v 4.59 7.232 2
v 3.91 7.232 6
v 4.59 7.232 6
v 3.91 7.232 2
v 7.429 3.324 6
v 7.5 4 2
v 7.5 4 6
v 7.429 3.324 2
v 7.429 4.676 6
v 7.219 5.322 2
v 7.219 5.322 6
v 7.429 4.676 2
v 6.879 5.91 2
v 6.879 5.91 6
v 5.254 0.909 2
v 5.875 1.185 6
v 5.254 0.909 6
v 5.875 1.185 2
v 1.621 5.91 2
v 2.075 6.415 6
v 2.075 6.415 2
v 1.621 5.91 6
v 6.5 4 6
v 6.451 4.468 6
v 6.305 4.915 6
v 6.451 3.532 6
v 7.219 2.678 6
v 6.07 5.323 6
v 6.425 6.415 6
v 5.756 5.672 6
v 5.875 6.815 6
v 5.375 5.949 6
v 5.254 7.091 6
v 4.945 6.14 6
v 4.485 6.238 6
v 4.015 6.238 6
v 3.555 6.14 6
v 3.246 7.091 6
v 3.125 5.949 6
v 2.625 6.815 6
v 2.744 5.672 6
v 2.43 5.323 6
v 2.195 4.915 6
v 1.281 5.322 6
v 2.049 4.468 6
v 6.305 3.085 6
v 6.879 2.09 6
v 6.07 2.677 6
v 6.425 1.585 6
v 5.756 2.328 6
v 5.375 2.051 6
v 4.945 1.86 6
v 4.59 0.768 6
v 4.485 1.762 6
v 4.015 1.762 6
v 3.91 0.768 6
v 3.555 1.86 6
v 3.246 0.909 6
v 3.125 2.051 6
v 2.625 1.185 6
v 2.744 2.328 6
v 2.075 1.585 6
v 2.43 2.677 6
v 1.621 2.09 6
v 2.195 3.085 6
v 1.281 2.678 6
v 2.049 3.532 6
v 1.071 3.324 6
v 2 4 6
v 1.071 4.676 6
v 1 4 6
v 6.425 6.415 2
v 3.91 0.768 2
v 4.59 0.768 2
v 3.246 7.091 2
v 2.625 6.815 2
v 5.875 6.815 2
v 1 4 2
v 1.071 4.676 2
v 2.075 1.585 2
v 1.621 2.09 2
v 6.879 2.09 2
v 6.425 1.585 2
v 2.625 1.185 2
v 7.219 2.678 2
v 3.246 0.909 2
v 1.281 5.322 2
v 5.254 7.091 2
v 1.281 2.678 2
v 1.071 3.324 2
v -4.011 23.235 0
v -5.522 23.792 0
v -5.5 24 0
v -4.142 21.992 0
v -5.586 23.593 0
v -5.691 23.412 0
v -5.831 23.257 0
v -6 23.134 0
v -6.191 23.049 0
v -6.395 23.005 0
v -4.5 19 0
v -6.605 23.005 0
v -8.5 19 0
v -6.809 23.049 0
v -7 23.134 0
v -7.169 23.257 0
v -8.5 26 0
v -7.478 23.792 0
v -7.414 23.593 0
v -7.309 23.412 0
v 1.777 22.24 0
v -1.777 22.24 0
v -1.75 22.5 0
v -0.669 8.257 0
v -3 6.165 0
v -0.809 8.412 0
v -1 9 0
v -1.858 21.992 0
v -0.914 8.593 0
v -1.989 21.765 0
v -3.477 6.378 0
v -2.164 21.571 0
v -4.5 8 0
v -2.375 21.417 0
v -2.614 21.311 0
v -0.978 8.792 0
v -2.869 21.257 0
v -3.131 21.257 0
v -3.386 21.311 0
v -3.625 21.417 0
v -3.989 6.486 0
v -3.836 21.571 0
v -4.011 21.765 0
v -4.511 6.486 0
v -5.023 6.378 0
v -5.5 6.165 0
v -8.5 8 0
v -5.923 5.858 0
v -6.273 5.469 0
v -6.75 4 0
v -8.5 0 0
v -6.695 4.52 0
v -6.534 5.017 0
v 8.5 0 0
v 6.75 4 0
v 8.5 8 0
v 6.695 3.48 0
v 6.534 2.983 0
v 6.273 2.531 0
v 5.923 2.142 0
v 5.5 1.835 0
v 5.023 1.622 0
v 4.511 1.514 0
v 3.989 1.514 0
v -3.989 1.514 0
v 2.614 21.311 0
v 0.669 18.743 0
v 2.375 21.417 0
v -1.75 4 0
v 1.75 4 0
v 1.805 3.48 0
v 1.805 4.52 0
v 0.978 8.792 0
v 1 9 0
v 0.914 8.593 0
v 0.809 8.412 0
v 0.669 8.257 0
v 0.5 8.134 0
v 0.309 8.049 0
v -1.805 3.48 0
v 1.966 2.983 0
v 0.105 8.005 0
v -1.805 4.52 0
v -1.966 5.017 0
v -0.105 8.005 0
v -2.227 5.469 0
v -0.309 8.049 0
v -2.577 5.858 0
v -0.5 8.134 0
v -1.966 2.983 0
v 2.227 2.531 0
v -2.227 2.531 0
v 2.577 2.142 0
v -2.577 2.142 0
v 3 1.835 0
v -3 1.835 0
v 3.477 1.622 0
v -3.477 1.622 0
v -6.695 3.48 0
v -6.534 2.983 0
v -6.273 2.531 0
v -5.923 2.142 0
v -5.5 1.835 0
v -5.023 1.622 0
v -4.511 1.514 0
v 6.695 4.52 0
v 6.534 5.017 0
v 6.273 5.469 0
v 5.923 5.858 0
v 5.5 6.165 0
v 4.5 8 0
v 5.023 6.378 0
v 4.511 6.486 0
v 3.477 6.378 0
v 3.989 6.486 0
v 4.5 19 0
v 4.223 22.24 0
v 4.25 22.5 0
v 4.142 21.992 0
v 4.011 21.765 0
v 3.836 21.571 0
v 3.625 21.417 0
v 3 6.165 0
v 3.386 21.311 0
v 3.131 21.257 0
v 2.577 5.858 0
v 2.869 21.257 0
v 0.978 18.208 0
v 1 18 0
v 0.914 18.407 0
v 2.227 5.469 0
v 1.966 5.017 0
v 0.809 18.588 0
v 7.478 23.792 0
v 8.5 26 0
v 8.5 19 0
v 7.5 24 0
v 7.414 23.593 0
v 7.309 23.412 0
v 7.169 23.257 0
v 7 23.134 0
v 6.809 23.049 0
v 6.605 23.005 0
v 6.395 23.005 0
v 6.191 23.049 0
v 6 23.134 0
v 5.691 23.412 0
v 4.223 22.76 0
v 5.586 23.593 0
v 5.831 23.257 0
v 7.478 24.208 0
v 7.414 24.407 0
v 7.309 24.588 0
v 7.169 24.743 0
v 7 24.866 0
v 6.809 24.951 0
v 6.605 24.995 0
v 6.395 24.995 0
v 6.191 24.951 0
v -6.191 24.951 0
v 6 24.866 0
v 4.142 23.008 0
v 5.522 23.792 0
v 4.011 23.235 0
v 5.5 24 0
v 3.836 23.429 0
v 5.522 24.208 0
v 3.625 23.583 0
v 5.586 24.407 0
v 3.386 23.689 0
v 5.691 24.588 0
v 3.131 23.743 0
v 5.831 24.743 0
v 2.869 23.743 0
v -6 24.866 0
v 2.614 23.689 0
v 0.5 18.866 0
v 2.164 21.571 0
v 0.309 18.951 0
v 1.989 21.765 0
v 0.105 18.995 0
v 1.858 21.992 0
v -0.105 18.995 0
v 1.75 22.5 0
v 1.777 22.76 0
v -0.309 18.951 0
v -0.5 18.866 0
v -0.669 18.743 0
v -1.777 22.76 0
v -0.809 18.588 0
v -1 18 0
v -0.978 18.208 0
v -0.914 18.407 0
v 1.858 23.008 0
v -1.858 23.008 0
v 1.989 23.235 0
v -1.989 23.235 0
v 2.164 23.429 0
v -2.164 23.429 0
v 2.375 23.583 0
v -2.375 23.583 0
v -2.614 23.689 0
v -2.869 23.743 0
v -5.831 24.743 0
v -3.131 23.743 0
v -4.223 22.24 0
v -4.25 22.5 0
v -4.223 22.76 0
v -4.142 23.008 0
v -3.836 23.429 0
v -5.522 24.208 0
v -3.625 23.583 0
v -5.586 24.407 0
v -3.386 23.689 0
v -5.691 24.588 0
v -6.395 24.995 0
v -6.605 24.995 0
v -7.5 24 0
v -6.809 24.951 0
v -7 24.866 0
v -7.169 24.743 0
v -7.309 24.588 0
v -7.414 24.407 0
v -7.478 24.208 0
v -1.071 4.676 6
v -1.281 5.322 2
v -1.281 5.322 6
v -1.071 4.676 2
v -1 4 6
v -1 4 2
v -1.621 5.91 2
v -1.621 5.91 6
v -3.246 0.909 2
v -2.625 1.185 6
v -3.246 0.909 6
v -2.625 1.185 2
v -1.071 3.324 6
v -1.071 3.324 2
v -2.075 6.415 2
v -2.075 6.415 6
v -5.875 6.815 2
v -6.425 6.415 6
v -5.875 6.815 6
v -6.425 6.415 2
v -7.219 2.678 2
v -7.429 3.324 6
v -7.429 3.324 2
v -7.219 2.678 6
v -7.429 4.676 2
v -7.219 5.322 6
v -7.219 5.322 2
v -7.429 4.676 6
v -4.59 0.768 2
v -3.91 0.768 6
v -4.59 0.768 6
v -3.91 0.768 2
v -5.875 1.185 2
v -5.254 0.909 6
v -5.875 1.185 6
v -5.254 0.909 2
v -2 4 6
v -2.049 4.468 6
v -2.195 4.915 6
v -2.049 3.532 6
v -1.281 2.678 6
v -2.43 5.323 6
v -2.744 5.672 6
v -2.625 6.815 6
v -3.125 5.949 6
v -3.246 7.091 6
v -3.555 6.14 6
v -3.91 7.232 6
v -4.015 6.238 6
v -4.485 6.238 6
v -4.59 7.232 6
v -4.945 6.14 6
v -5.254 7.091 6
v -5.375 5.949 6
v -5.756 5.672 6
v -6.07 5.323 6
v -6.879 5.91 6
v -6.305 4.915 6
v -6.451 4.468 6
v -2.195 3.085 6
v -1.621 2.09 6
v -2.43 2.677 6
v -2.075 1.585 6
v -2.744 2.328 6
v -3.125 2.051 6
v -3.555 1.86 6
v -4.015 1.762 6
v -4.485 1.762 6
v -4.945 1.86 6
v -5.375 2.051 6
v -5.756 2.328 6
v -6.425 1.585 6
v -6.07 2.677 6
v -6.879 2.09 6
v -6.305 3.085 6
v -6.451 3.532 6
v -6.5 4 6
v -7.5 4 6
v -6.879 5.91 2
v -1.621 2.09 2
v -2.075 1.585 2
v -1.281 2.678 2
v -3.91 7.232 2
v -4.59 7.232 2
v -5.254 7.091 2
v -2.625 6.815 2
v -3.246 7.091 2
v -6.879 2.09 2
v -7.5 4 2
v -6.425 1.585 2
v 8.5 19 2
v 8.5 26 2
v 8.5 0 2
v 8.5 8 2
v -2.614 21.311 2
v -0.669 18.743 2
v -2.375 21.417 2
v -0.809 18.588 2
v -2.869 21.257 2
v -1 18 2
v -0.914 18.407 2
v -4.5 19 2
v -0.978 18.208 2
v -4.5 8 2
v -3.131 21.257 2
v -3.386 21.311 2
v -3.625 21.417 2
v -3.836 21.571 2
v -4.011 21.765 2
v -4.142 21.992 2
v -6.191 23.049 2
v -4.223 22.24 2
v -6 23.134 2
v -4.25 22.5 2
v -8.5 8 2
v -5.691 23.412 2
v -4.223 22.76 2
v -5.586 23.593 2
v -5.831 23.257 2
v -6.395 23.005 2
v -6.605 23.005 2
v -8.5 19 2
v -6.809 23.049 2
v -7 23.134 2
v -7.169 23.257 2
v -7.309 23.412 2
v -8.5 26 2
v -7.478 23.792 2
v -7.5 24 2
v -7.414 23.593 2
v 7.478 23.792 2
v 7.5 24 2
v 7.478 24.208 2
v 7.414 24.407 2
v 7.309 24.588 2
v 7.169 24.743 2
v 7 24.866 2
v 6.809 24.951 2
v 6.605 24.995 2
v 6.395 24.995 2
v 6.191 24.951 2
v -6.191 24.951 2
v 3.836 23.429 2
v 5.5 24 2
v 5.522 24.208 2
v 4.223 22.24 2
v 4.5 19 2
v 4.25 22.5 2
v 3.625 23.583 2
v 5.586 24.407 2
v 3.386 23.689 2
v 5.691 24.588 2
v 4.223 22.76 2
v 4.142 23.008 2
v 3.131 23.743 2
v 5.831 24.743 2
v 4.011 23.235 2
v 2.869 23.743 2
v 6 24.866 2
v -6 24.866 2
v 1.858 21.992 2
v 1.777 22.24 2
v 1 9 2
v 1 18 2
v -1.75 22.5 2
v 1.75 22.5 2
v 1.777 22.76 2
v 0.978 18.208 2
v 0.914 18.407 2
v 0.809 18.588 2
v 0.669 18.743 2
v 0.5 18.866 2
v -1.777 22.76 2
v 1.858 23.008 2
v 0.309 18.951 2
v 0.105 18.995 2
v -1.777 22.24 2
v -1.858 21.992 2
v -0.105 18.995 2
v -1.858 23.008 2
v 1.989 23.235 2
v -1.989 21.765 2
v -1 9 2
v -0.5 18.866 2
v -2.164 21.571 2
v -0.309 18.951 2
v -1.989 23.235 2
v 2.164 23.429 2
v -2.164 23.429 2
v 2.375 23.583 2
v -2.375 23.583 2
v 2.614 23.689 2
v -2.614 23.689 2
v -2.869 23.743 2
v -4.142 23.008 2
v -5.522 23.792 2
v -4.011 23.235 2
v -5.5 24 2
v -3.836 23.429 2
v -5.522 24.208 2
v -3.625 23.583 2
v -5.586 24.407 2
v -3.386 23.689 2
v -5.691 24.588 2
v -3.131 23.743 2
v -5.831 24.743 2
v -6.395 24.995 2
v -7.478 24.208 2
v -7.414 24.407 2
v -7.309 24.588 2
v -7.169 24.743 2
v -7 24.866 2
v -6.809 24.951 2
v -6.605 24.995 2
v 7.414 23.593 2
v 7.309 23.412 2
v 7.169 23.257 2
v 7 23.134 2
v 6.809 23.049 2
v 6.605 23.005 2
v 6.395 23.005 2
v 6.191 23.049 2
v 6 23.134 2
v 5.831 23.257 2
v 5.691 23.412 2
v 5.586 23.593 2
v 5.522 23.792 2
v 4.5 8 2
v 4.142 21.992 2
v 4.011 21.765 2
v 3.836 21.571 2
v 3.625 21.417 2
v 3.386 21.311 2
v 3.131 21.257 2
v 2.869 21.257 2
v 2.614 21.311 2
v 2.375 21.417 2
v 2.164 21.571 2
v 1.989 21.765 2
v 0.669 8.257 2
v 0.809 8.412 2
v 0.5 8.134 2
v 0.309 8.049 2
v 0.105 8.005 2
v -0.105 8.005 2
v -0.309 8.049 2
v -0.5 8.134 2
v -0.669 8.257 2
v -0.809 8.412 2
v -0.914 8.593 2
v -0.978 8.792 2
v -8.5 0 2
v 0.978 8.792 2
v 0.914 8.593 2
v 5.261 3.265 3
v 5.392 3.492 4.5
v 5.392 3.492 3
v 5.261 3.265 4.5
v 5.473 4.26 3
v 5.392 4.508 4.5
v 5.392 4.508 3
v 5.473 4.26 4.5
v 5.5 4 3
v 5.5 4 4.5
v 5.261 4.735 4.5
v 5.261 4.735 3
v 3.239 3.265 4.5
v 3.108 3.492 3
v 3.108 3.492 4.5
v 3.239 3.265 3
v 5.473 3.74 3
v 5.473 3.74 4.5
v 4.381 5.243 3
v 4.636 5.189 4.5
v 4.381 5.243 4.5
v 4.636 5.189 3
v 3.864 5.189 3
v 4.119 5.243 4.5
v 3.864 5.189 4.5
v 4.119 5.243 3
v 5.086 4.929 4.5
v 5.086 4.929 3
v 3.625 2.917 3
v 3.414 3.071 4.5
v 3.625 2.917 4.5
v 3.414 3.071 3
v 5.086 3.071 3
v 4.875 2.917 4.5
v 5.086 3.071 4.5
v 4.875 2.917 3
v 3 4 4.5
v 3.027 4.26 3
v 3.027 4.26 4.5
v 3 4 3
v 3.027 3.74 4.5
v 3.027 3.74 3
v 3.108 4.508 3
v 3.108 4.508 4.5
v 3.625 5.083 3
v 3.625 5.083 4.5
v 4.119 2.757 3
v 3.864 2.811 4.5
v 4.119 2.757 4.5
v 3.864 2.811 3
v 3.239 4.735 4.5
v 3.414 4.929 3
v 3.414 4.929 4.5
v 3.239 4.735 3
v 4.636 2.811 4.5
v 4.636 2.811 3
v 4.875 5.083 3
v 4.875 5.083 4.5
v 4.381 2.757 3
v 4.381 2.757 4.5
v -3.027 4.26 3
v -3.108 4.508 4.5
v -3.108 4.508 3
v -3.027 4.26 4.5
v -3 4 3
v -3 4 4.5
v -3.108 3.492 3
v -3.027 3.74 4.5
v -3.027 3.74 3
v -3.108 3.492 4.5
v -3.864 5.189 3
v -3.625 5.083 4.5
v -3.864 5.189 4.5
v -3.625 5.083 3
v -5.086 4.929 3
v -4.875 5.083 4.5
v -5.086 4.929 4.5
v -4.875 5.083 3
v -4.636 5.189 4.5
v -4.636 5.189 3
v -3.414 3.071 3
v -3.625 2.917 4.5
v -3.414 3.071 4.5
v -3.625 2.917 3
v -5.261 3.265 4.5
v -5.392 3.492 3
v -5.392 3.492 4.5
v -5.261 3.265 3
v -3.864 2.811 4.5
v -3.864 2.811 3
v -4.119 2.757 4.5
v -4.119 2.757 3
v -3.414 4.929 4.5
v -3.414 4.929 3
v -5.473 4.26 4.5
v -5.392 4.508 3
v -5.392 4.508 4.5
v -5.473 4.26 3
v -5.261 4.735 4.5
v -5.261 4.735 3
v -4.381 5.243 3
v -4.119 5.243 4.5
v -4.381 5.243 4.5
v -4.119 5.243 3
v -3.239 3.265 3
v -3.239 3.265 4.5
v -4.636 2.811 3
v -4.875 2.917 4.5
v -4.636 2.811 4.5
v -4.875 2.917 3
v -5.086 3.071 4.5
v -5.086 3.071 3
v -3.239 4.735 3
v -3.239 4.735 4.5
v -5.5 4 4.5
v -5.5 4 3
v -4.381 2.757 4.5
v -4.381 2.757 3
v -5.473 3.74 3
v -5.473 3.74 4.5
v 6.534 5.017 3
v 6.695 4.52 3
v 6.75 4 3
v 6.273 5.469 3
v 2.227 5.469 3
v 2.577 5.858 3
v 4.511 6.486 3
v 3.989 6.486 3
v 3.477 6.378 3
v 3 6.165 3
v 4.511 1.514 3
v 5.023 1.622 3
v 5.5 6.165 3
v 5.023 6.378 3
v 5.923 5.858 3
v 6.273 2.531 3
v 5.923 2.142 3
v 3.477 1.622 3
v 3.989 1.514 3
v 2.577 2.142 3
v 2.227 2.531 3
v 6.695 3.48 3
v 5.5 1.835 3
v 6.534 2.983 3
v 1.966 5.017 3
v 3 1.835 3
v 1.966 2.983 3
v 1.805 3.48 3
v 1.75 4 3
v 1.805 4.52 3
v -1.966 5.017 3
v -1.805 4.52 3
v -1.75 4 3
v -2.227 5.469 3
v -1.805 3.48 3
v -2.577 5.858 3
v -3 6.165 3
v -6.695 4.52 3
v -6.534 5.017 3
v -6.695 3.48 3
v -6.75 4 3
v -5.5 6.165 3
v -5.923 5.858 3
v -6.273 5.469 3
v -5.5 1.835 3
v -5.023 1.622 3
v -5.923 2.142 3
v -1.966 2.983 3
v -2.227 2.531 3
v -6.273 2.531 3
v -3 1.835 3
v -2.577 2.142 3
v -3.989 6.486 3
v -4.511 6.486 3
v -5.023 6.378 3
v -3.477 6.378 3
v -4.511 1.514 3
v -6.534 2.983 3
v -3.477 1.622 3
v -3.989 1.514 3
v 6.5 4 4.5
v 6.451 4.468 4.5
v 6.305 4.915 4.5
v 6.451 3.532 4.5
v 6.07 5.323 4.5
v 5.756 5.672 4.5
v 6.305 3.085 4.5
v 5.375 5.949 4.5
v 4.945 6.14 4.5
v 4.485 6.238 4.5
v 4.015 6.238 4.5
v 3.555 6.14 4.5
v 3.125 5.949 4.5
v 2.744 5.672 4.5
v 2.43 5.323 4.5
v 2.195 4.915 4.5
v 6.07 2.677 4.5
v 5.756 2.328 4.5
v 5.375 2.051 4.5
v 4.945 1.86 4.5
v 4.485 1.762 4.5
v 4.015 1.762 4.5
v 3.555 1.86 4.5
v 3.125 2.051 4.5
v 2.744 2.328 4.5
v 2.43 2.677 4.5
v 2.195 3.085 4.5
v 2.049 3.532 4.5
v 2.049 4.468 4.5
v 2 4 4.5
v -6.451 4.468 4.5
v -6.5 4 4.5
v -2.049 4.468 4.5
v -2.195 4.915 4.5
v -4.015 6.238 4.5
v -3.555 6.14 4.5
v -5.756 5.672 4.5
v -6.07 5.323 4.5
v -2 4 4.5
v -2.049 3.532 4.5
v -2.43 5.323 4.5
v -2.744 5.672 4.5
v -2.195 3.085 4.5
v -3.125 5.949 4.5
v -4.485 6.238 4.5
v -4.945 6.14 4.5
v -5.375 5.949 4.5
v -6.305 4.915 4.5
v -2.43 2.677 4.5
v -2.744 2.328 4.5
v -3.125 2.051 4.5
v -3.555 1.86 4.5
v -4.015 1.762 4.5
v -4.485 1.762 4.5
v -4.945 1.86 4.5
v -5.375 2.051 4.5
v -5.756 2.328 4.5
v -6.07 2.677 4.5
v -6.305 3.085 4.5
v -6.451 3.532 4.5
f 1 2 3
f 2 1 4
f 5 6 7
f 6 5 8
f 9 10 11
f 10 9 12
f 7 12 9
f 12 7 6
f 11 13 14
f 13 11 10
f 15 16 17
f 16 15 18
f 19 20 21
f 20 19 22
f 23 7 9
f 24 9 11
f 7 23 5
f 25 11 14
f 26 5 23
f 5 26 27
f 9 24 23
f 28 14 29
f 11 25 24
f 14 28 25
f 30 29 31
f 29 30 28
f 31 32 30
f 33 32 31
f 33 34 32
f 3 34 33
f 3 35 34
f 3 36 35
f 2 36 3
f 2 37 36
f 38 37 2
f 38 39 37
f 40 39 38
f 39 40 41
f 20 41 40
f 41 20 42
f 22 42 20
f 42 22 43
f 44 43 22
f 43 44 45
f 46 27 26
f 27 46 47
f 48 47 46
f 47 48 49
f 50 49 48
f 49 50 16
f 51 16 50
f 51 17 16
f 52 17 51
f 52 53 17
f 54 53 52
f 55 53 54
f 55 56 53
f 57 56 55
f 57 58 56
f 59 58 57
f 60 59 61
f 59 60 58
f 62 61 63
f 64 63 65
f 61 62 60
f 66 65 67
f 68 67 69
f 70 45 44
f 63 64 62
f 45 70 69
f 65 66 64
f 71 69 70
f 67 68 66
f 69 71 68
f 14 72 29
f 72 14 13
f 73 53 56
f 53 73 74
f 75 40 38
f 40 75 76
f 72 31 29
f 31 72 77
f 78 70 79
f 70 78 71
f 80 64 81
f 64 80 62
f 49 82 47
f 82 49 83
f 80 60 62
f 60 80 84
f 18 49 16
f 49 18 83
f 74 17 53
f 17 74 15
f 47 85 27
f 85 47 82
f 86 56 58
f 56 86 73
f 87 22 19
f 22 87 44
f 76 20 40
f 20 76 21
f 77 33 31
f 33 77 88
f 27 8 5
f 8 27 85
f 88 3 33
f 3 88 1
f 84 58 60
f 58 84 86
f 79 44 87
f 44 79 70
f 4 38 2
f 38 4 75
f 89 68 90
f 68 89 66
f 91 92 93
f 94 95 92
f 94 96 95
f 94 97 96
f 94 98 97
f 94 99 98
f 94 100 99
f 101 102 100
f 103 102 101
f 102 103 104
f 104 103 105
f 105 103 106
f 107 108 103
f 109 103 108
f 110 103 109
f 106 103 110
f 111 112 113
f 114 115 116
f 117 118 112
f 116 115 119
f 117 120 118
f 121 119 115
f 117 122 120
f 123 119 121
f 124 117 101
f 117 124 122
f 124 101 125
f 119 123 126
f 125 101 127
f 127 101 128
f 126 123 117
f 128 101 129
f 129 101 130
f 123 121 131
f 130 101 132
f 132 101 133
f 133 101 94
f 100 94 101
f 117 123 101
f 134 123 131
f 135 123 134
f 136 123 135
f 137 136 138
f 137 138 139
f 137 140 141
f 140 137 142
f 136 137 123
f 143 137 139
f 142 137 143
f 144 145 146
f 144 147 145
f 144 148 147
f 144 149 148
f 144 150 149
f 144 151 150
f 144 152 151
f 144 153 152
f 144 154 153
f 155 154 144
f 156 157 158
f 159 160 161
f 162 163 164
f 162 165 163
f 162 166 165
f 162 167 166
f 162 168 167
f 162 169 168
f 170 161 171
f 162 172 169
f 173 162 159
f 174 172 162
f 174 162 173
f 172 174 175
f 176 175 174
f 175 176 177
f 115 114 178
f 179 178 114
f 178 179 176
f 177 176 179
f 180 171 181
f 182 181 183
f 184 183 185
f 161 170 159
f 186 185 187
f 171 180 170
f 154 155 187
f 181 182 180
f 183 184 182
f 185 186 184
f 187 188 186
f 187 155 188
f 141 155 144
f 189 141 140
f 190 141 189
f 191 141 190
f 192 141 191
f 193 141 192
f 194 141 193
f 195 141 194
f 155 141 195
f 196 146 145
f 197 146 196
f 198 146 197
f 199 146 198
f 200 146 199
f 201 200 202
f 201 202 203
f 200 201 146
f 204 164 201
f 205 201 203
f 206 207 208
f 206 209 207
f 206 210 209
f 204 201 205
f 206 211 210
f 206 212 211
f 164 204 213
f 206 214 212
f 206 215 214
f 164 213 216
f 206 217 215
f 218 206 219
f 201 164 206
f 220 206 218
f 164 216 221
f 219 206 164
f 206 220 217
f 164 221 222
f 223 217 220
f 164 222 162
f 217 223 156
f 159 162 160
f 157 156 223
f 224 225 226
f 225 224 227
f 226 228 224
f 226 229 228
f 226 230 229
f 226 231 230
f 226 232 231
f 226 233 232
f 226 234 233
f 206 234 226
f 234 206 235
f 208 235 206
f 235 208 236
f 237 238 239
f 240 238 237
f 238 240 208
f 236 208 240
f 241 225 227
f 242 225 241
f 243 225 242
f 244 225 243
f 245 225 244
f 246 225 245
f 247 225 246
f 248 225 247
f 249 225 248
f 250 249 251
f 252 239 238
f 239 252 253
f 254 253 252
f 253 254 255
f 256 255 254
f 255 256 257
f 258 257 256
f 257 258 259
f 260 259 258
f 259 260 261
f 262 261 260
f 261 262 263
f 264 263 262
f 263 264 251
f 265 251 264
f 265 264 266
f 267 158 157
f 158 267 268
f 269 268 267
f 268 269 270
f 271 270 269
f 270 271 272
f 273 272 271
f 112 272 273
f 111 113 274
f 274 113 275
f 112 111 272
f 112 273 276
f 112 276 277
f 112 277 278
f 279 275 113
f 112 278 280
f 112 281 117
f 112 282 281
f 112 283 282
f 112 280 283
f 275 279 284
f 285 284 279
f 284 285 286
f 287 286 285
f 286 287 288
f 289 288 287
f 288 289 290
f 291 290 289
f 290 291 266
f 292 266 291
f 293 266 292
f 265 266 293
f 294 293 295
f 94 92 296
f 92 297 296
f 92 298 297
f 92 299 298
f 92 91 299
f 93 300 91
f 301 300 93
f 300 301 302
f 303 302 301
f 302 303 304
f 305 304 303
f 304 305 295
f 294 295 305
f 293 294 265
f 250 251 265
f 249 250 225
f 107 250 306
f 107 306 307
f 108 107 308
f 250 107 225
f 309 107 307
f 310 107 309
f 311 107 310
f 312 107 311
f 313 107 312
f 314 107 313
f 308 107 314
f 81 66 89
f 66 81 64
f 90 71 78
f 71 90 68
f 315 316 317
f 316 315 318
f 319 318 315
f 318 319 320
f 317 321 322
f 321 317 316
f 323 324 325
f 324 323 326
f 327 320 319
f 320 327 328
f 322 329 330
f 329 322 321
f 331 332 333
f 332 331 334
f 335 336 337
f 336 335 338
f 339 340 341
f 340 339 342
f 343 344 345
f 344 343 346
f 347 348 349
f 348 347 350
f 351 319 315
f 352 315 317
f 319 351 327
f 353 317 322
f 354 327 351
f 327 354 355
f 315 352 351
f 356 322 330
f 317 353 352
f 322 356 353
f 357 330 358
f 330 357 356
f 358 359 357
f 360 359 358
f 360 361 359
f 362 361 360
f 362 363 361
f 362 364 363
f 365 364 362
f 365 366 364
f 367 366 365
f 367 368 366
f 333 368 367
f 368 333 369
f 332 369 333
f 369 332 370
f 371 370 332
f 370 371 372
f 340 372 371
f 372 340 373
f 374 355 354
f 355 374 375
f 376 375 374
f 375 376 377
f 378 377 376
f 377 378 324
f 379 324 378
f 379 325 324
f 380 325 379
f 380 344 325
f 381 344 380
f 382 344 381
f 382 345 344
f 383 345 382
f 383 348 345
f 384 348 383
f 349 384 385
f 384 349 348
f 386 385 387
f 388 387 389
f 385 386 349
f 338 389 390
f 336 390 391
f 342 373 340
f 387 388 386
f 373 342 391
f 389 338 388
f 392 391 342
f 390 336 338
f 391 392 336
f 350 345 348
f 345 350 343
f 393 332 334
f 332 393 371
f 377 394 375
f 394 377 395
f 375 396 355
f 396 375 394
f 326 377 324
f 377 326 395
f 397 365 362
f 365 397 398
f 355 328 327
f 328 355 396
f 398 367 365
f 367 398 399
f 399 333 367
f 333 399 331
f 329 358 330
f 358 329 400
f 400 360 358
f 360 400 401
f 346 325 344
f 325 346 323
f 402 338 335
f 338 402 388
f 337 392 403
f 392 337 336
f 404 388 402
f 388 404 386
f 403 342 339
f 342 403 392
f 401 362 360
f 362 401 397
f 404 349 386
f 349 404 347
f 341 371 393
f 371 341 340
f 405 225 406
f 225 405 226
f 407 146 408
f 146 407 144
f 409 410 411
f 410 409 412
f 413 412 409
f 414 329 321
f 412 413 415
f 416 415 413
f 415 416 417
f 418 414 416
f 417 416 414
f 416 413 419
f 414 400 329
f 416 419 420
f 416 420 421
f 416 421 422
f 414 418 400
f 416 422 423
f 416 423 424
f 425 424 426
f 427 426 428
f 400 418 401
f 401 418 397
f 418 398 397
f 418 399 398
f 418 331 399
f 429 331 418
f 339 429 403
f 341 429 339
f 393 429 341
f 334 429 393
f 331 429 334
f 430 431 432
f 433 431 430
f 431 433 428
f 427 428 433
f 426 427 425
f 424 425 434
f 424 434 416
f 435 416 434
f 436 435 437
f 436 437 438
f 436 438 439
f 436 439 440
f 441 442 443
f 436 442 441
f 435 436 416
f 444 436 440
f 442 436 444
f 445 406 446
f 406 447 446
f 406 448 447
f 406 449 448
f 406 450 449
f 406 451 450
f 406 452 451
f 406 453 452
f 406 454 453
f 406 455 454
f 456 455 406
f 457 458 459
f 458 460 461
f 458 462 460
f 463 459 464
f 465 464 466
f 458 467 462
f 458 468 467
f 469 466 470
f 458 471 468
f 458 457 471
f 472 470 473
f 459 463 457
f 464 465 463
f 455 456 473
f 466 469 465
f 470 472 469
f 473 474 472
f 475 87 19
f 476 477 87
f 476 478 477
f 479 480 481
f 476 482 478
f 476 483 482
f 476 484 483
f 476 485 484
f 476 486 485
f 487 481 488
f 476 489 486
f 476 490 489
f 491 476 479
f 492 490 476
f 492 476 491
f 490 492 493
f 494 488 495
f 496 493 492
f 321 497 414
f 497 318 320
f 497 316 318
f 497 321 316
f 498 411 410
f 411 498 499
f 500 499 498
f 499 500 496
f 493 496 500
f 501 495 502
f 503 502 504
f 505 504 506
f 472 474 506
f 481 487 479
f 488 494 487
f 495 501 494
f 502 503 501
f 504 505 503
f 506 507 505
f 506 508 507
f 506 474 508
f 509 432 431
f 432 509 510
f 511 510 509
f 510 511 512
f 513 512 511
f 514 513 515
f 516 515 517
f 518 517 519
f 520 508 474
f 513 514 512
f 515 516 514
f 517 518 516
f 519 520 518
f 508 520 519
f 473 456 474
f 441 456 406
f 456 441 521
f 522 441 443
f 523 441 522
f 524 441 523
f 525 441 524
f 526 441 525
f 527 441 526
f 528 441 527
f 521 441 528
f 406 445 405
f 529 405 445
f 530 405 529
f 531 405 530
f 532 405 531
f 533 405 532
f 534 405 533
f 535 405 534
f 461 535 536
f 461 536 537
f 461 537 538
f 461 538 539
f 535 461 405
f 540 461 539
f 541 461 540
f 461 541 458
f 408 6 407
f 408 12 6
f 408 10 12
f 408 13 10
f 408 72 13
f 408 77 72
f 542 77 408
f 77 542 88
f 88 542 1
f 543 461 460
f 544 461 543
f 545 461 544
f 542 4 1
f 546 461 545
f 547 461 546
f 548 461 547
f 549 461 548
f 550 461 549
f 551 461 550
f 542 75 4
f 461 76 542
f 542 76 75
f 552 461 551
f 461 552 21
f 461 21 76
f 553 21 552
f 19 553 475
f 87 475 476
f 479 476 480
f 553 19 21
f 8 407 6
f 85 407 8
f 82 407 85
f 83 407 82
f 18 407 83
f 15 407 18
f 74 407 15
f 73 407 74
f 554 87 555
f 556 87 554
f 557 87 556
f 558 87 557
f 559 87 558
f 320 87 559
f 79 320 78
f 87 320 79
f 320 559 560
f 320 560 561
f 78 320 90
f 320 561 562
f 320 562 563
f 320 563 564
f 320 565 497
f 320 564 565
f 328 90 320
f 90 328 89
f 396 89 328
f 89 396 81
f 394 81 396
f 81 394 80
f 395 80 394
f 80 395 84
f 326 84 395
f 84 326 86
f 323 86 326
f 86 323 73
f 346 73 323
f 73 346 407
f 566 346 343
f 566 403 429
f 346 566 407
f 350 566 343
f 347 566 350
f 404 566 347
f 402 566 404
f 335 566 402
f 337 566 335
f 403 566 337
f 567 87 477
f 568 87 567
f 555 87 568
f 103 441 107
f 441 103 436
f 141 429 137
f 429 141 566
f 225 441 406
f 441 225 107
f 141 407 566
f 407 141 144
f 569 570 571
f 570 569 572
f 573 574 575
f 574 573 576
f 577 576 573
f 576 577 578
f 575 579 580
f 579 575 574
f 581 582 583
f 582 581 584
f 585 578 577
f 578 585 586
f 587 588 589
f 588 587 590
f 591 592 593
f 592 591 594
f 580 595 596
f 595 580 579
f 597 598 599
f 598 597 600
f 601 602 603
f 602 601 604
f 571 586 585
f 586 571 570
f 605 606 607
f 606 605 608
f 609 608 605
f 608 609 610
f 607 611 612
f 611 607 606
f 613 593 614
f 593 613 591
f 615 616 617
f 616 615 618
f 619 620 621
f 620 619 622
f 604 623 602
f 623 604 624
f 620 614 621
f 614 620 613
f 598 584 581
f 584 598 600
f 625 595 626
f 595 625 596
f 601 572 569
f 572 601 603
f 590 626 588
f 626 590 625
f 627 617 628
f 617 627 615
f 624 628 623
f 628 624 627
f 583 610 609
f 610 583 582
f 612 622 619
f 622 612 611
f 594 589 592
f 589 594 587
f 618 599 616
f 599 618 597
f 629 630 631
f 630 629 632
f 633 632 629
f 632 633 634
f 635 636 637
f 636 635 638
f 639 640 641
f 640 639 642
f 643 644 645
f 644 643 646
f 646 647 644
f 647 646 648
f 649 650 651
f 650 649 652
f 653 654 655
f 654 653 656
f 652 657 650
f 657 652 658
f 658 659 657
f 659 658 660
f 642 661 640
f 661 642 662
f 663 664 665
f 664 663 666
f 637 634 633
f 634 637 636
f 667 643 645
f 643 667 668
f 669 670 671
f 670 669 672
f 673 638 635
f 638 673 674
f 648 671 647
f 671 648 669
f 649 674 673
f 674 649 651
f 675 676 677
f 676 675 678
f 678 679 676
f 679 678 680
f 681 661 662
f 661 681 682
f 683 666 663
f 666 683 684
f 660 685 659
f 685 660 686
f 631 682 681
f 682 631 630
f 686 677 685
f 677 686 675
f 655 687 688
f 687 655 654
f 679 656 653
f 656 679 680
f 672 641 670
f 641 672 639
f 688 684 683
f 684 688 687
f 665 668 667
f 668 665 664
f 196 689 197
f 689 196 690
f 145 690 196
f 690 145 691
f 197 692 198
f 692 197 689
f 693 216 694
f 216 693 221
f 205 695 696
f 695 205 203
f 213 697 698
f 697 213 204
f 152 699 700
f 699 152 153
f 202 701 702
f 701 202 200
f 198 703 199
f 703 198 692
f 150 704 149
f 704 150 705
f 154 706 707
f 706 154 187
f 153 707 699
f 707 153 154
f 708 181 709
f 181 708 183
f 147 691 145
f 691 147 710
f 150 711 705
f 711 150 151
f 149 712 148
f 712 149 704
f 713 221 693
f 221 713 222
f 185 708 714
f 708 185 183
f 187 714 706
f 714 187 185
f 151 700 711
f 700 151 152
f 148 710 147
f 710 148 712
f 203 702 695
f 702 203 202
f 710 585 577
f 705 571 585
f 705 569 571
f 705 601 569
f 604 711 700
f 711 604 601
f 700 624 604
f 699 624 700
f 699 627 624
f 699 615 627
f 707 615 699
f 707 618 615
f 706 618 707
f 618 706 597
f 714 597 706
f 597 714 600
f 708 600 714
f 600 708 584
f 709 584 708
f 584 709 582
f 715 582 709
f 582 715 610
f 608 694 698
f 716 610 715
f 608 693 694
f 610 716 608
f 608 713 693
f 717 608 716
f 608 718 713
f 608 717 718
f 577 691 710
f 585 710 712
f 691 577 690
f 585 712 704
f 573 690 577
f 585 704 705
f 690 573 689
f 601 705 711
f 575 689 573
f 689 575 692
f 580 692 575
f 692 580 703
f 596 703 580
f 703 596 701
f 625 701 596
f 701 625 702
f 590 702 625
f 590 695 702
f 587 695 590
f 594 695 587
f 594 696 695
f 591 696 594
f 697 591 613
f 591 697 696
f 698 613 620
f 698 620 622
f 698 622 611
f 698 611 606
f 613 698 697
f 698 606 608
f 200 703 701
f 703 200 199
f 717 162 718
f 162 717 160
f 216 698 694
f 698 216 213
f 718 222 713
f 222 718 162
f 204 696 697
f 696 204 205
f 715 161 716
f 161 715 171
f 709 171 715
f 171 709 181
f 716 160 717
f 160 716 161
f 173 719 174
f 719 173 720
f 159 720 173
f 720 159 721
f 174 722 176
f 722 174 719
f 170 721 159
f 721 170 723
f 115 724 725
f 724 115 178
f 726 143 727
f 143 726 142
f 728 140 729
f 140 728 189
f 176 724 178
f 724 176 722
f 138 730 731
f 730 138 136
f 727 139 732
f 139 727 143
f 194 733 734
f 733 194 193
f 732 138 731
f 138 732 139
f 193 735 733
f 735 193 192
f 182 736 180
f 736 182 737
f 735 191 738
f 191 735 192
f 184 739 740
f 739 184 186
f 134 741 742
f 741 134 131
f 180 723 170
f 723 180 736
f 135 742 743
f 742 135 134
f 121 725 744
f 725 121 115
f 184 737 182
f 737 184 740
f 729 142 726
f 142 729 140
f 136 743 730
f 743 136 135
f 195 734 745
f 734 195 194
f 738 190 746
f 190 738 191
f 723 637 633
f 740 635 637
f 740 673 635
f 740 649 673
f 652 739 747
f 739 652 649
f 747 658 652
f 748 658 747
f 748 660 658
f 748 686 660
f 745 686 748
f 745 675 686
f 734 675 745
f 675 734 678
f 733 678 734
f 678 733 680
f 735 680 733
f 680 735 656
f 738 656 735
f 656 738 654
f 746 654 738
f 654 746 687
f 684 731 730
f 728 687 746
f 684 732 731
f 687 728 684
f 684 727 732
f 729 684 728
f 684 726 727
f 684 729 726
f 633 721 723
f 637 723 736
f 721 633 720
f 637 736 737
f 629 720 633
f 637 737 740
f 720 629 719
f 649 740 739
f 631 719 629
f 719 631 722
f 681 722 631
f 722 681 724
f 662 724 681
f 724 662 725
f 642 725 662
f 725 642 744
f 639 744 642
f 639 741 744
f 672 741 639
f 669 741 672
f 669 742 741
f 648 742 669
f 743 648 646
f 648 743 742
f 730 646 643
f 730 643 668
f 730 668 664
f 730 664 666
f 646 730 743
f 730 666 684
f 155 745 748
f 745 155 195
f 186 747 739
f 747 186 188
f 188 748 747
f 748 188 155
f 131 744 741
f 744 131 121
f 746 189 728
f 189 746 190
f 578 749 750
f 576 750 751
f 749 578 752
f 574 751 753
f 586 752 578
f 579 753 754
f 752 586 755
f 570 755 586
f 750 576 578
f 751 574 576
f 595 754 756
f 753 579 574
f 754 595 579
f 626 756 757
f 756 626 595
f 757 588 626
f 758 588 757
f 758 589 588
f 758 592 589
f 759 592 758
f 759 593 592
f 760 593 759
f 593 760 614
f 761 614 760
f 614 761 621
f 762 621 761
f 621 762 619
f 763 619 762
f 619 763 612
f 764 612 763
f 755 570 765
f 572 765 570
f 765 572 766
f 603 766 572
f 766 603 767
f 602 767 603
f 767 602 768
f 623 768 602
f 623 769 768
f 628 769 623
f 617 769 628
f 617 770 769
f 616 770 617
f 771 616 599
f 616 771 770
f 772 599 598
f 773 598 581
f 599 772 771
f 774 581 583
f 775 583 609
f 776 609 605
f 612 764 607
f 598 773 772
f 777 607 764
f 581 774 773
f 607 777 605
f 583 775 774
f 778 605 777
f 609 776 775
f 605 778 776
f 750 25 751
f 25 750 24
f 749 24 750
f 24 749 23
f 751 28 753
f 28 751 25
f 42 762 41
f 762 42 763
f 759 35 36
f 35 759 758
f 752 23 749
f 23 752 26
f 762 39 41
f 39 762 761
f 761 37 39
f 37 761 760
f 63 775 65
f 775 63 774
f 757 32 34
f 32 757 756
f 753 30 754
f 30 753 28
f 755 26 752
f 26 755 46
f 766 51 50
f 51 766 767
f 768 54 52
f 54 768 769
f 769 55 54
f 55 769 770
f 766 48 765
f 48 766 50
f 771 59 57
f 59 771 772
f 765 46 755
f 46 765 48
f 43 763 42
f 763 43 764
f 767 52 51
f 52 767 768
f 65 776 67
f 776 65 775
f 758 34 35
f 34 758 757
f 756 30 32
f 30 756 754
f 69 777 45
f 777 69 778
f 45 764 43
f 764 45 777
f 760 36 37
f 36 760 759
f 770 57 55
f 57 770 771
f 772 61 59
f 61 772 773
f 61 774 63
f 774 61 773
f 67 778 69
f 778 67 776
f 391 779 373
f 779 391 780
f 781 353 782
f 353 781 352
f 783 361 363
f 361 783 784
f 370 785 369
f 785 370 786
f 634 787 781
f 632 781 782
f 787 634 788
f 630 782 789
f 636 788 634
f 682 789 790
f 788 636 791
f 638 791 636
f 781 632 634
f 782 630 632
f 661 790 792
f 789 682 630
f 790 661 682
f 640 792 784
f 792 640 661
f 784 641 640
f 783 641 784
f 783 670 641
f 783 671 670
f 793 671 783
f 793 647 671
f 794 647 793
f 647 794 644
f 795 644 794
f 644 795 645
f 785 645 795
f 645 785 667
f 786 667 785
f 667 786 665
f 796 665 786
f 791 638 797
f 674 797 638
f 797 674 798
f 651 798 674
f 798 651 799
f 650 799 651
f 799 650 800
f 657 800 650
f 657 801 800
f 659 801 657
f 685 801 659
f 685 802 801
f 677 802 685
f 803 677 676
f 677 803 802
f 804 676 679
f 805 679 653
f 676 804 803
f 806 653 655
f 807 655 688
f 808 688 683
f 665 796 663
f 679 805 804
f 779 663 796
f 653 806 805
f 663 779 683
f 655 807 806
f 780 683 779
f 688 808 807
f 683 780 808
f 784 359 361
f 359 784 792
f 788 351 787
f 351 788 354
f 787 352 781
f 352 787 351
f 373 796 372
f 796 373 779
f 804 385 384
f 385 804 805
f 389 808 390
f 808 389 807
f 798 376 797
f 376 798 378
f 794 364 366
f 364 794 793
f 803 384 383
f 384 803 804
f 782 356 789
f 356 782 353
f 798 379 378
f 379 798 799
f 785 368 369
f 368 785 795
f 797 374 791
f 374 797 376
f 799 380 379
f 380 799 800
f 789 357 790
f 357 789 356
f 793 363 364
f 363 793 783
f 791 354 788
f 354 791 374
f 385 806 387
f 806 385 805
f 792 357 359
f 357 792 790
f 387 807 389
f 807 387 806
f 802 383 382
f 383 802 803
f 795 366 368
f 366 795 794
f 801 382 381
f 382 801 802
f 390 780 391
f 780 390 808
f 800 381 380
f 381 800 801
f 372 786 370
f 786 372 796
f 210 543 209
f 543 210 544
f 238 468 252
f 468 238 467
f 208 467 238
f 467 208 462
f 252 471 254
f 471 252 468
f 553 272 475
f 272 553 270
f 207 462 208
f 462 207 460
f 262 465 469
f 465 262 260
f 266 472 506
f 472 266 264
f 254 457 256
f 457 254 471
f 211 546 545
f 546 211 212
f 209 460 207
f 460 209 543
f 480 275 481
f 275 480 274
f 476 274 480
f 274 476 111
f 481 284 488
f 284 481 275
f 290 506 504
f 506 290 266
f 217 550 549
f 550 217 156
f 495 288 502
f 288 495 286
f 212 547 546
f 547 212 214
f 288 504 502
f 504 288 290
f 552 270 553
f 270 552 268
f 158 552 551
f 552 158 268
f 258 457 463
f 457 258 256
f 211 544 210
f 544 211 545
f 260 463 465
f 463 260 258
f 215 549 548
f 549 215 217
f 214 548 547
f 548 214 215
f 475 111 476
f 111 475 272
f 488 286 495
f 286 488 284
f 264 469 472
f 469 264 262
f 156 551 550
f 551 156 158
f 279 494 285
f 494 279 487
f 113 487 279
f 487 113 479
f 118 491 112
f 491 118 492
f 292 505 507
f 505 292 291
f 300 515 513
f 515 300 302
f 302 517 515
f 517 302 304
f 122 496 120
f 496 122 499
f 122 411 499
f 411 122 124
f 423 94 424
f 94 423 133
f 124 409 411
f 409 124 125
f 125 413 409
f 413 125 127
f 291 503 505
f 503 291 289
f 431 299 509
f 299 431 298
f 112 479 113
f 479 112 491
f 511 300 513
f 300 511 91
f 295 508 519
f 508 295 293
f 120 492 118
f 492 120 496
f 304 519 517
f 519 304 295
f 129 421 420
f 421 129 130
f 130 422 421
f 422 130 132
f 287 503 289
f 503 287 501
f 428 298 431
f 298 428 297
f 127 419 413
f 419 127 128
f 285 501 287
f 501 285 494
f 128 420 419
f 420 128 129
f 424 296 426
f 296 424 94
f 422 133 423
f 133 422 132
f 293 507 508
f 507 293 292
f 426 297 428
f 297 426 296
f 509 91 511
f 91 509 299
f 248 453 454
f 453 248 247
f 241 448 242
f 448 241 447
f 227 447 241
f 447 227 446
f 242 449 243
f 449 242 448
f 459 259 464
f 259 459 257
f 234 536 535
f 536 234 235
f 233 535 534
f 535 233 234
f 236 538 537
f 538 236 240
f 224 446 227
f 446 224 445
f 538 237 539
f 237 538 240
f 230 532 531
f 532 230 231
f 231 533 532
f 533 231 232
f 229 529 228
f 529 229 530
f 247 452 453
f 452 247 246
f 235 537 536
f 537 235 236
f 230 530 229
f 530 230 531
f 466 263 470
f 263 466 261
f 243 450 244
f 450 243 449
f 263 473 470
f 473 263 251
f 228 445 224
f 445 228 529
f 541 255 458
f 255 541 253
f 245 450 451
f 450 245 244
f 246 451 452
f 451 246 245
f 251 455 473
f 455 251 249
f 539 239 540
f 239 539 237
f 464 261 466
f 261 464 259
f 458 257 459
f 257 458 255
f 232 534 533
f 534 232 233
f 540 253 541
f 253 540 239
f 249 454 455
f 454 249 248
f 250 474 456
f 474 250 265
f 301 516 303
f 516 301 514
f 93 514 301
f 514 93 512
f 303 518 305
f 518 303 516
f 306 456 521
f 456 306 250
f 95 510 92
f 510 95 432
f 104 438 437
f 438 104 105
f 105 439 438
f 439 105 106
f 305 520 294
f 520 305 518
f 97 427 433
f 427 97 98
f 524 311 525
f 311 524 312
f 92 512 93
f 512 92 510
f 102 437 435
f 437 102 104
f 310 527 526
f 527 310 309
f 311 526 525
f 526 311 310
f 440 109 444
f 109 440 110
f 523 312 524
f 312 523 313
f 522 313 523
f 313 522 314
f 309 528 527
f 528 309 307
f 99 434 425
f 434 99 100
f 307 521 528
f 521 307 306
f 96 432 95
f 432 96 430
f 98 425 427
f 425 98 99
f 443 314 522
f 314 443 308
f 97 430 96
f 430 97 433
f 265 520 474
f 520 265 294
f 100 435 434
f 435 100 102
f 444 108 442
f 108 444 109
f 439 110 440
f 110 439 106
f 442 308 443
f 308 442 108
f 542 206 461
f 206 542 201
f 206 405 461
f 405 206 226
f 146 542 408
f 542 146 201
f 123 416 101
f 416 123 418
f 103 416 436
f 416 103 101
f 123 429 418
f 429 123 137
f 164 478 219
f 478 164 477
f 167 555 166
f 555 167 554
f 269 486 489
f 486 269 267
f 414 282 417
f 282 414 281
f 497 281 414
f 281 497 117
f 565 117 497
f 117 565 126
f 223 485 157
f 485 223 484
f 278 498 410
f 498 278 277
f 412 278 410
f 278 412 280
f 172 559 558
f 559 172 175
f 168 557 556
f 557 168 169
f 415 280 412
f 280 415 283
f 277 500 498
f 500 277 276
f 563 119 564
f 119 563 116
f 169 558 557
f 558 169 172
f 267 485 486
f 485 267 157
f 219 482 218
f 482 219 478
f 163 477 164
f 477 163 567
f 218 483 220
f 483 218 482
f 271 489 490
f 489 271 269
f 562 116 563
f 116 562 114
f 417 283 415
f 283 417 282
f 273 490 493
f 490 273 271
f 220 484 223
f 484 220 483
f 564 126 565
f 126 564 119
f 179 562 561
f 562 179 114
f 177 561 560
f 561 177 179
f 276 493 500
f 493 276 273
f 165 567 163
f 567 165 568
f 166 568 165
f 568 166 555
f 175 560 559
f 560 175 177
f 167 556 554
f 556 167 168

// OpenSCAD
// rc del för truckpeter

$fs = 0.1;

h1_l = 4; // längd från kanten till första hålen
h2_l = 4+18.5; // längd från kanten till andra hålen
h3_l = 4+20; // längd från kanten till tredje hålen

h1_w = 8.5; // avstånd mellan hålen
h2_w = 6;
h3_w = 13; // kanske typ 12.8

h1_d = 2.5;
h2_d = 2.5;
h3_d = 2;

h1_h = 100;

h11_d = 5; //hål 1 va ju lite mer hål i...
h11_h = 3;

h12_d = 2;
h12_h = 1.5;

h13_d = 4.5;
h13_h = 1.5;

c1_d = 6.5;
c1_h = h11_h + h12_h + h13_h;

v_x = 9/2;
v_y = 8;
v_w = 10;
v_l = 11;

x = 17;
y = 26;
z = 2;

union() {
    difference() {
        union() {
            translate([h1_w/2, h1_l, 0]) cylinder(d=c1_d, h=c1_h);
            translate([-h1_w/2, h1_l, 0]) cylinder(d=c1_d, h=c1_h);
            translate([-x/2, 0, 0]) cube([x, y, z]);
        }
        // Första hålen
        translate([h1_w/2, h1_l, 0]) cylinder(d=h1_d, h=h1_h);
        translate([-h1_w/2, h1_l, 0]) cylinder(d=h1_d, h=h1_h);
        
        translate([h1_w/2, h1_l, 0]) cylinder(d=h11_d, h=h11_h);
        translate([-h1_w/2, h1_l, 0]) cylinder(d=h11_d, h=h11_h);
        
        translate([h1_w/2, h1_l, h11_h]) cylinder(d=h12_d, h=h12_h);
        translate([-h1_w/2, h1_l, h11_h]) cylinder(d=h12_d, h=h12_h);
        
        translate([h1_w/2, h1_l, h11_h+h12_h]) cylinder(d=h13_d, h=h13_h);
        translate([-h1_w/2, h1_l, h11_h+h12_h]) cylinder(d=h13_d, h=h13_h);
        
        
        // Andra hålen
        translate([h2_w/2, h2_l, 0]) cylinder(d=h2_d, h=h1_h);
        translate([-h2_w/2, h2_l, 0]) cylinder(d=h2_d, h=h1_h);
        
        // tredje hålen
        translate([h3_w/2, h3_l, 0]) cylinder(d=h3_d, h=h1_h);
        translate([-h3_w/2, h3_l, 0]) cylinder(d=h3_d, h=h1_h);
        
        // sidoväggar
        translate([v_x, v_y, 0]) cube([v_w, v_l, z]);
        translate([-v_x-v_w, v_y, 0]) cube([v_w, v_l, z]);
        
        // mitträmsa
        hull() {
            translate([0, v_y+1, 0]) cylinder(d=2, h=z);
            translate([0, v_y+v_l-1, 0]) cylinder(d=2, h=z);
        }
        
    }

}
